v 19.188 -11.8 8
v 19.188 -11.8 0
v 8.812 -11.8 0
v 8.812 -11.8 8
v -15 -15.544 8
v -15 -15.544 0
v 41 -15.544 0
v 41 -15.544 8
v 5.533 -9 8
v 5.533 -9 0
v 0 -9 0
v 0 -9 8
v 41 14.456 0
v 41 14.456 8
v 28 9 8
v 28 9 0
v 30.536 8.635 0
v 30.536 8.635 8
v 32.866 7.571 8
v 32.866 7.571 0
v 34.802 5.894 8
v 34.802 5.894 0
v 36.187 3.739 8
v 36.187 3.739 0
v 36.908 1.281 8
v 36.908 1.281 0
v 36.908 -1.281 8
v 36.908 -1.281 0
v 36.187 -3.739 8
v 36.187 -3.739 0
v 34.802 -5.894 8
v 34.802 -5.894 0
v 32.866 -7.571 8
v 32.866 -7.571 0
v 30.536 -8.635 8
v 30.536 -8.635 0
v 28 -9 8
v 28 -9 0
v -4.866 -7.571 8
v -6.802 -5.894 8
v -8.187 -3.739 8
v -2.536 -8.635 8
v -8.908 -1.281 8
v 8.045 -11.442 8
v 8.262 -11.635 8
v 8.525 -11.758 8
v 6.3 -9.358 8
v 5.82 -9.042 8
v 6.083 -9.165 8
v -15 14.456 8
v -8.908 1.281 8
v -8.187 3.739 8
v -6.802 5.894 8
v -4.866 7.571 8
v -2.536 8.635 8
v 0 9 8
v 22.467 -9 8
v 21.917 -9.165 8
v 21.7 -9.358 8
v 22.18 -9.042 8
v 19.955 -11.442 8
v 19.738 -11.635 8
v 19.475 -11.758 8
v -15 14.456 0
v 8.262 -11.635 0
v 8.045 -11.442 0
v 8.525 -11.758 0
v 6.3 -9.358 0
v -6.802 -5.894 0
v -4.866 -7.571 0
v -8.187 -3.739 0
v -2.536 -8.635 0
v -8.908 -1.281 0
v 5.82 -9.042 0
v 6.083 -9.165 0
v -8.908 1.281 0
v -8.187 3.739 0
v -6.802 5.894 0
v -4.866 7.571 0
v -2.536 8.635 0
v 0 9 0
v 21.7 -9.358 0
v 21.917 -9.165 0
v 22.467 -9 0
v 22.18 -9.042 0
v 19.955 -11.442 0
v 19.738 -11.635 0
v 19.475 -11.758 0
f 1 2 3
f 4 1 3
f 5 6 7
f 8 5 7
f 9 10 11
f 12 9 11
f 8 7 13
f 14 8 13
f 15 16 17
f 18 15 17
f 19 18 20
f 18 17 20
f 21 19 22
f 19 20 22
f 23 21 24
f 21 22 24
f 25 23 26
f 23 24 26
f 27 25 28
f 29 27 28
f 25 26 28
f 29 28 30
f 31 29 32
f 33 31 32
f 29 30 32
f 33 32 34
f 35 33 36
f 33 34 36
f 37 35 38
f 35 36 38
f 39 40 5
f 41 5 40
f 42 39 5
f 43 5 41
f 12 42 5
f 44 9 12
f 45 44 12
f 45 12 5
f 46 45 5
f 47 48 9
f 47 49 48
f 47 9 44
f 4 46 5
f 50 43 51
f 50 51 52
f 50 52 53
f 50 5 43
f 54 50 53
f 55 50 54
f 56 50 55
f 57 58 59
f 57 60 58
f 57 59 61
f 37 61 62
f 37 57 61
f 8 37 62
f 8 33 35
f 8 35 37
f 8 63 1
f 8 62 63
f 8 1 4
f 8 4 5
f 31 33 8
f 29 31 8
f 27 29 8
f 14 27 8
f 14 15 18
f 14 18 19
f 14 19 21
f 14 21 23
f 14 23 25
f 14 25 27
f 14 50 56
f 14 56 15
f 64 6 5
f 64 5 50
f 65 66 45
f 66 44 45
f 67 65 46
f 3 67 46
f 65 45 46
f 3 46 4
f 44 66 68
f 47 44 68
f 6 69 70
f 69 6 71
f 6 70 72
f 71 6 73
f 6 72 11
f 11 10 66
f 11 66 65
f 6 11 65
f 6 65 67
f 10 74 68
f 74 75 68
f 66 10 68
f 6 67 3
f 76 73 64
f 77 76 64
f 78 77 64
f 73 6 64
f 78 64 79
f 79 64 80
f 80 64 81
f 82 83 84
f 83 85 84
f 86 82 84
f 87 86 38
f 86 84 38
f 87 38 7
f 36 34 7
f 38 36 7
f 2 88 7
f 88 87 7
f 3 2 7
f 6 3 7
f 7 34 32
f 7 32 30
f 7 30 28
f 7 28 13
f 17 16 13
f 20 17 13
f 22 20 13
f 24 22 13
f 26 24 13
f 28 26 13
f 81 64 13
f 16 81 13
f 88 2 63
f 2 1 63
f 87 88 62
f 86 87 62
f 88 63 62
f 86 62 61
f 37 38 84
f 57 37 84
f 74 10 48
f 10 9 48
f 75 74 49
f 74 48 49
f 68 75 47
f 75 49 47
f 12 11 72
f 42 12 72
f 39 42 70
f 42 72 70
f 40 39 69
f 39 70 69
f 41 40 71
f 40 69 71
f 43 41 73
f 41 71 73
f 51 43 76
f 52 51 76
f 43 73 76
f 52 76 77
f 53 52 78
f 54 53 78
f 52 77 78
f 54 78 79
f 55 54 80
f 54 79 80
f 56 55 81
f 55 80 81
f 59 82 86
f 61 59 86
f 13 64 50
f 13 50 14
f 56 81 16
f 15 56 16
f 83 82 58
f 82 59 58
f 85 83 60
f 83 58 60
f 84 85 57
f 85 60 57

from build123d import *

# Parameters (mm, degrees)
SKETCH_1_W      = 56
SKETCH_1_H      = 30
EXTRUDE_1_DEPTH = 8
FILLET_1_R      = 1


with BuildPart() as part:
    # 草图1 → 凸台-拉伸1 (new body)
    with BuildSketch(Plane.XY):
        with Locations((13, -0.54396632)):
            Rectangle(SKETCH_1_W, SKETCH_1_H)
        with BuildLine():
            Line((0, 9), (28, 9))
            ThreePointArc((28, 9), (37, 0), (28, -9))
            Line((28, -9), (22, -9))
            Line((22, -9), (19.655104495, -11.8))
            Line((19.655104495, -11.8), (8.344895505, -11.8))
            Line((8.344895505, -11.8), (6, -9))
            Line((6, -9), (0, -9))
            ThreePointArc((0, -9), (-9, 0), (0, 9))
        make_face(mode=Mode.SUBTRACT)
    extrude(amount=EXTRUDE_1_DEPTH)

    # 圆角1
    fillet_1_edges = [part.edges().sort_by_distance(p)[0] for p in [
        (6, -9, 4),
        (8.344895505, -11.8, 4),
        (19.655104495, -11.8, 4),
        (22, -9, 4),
    ]]
    fillet(fillet_1_edges, radius=FILLET_1_R)


solid = part.part
